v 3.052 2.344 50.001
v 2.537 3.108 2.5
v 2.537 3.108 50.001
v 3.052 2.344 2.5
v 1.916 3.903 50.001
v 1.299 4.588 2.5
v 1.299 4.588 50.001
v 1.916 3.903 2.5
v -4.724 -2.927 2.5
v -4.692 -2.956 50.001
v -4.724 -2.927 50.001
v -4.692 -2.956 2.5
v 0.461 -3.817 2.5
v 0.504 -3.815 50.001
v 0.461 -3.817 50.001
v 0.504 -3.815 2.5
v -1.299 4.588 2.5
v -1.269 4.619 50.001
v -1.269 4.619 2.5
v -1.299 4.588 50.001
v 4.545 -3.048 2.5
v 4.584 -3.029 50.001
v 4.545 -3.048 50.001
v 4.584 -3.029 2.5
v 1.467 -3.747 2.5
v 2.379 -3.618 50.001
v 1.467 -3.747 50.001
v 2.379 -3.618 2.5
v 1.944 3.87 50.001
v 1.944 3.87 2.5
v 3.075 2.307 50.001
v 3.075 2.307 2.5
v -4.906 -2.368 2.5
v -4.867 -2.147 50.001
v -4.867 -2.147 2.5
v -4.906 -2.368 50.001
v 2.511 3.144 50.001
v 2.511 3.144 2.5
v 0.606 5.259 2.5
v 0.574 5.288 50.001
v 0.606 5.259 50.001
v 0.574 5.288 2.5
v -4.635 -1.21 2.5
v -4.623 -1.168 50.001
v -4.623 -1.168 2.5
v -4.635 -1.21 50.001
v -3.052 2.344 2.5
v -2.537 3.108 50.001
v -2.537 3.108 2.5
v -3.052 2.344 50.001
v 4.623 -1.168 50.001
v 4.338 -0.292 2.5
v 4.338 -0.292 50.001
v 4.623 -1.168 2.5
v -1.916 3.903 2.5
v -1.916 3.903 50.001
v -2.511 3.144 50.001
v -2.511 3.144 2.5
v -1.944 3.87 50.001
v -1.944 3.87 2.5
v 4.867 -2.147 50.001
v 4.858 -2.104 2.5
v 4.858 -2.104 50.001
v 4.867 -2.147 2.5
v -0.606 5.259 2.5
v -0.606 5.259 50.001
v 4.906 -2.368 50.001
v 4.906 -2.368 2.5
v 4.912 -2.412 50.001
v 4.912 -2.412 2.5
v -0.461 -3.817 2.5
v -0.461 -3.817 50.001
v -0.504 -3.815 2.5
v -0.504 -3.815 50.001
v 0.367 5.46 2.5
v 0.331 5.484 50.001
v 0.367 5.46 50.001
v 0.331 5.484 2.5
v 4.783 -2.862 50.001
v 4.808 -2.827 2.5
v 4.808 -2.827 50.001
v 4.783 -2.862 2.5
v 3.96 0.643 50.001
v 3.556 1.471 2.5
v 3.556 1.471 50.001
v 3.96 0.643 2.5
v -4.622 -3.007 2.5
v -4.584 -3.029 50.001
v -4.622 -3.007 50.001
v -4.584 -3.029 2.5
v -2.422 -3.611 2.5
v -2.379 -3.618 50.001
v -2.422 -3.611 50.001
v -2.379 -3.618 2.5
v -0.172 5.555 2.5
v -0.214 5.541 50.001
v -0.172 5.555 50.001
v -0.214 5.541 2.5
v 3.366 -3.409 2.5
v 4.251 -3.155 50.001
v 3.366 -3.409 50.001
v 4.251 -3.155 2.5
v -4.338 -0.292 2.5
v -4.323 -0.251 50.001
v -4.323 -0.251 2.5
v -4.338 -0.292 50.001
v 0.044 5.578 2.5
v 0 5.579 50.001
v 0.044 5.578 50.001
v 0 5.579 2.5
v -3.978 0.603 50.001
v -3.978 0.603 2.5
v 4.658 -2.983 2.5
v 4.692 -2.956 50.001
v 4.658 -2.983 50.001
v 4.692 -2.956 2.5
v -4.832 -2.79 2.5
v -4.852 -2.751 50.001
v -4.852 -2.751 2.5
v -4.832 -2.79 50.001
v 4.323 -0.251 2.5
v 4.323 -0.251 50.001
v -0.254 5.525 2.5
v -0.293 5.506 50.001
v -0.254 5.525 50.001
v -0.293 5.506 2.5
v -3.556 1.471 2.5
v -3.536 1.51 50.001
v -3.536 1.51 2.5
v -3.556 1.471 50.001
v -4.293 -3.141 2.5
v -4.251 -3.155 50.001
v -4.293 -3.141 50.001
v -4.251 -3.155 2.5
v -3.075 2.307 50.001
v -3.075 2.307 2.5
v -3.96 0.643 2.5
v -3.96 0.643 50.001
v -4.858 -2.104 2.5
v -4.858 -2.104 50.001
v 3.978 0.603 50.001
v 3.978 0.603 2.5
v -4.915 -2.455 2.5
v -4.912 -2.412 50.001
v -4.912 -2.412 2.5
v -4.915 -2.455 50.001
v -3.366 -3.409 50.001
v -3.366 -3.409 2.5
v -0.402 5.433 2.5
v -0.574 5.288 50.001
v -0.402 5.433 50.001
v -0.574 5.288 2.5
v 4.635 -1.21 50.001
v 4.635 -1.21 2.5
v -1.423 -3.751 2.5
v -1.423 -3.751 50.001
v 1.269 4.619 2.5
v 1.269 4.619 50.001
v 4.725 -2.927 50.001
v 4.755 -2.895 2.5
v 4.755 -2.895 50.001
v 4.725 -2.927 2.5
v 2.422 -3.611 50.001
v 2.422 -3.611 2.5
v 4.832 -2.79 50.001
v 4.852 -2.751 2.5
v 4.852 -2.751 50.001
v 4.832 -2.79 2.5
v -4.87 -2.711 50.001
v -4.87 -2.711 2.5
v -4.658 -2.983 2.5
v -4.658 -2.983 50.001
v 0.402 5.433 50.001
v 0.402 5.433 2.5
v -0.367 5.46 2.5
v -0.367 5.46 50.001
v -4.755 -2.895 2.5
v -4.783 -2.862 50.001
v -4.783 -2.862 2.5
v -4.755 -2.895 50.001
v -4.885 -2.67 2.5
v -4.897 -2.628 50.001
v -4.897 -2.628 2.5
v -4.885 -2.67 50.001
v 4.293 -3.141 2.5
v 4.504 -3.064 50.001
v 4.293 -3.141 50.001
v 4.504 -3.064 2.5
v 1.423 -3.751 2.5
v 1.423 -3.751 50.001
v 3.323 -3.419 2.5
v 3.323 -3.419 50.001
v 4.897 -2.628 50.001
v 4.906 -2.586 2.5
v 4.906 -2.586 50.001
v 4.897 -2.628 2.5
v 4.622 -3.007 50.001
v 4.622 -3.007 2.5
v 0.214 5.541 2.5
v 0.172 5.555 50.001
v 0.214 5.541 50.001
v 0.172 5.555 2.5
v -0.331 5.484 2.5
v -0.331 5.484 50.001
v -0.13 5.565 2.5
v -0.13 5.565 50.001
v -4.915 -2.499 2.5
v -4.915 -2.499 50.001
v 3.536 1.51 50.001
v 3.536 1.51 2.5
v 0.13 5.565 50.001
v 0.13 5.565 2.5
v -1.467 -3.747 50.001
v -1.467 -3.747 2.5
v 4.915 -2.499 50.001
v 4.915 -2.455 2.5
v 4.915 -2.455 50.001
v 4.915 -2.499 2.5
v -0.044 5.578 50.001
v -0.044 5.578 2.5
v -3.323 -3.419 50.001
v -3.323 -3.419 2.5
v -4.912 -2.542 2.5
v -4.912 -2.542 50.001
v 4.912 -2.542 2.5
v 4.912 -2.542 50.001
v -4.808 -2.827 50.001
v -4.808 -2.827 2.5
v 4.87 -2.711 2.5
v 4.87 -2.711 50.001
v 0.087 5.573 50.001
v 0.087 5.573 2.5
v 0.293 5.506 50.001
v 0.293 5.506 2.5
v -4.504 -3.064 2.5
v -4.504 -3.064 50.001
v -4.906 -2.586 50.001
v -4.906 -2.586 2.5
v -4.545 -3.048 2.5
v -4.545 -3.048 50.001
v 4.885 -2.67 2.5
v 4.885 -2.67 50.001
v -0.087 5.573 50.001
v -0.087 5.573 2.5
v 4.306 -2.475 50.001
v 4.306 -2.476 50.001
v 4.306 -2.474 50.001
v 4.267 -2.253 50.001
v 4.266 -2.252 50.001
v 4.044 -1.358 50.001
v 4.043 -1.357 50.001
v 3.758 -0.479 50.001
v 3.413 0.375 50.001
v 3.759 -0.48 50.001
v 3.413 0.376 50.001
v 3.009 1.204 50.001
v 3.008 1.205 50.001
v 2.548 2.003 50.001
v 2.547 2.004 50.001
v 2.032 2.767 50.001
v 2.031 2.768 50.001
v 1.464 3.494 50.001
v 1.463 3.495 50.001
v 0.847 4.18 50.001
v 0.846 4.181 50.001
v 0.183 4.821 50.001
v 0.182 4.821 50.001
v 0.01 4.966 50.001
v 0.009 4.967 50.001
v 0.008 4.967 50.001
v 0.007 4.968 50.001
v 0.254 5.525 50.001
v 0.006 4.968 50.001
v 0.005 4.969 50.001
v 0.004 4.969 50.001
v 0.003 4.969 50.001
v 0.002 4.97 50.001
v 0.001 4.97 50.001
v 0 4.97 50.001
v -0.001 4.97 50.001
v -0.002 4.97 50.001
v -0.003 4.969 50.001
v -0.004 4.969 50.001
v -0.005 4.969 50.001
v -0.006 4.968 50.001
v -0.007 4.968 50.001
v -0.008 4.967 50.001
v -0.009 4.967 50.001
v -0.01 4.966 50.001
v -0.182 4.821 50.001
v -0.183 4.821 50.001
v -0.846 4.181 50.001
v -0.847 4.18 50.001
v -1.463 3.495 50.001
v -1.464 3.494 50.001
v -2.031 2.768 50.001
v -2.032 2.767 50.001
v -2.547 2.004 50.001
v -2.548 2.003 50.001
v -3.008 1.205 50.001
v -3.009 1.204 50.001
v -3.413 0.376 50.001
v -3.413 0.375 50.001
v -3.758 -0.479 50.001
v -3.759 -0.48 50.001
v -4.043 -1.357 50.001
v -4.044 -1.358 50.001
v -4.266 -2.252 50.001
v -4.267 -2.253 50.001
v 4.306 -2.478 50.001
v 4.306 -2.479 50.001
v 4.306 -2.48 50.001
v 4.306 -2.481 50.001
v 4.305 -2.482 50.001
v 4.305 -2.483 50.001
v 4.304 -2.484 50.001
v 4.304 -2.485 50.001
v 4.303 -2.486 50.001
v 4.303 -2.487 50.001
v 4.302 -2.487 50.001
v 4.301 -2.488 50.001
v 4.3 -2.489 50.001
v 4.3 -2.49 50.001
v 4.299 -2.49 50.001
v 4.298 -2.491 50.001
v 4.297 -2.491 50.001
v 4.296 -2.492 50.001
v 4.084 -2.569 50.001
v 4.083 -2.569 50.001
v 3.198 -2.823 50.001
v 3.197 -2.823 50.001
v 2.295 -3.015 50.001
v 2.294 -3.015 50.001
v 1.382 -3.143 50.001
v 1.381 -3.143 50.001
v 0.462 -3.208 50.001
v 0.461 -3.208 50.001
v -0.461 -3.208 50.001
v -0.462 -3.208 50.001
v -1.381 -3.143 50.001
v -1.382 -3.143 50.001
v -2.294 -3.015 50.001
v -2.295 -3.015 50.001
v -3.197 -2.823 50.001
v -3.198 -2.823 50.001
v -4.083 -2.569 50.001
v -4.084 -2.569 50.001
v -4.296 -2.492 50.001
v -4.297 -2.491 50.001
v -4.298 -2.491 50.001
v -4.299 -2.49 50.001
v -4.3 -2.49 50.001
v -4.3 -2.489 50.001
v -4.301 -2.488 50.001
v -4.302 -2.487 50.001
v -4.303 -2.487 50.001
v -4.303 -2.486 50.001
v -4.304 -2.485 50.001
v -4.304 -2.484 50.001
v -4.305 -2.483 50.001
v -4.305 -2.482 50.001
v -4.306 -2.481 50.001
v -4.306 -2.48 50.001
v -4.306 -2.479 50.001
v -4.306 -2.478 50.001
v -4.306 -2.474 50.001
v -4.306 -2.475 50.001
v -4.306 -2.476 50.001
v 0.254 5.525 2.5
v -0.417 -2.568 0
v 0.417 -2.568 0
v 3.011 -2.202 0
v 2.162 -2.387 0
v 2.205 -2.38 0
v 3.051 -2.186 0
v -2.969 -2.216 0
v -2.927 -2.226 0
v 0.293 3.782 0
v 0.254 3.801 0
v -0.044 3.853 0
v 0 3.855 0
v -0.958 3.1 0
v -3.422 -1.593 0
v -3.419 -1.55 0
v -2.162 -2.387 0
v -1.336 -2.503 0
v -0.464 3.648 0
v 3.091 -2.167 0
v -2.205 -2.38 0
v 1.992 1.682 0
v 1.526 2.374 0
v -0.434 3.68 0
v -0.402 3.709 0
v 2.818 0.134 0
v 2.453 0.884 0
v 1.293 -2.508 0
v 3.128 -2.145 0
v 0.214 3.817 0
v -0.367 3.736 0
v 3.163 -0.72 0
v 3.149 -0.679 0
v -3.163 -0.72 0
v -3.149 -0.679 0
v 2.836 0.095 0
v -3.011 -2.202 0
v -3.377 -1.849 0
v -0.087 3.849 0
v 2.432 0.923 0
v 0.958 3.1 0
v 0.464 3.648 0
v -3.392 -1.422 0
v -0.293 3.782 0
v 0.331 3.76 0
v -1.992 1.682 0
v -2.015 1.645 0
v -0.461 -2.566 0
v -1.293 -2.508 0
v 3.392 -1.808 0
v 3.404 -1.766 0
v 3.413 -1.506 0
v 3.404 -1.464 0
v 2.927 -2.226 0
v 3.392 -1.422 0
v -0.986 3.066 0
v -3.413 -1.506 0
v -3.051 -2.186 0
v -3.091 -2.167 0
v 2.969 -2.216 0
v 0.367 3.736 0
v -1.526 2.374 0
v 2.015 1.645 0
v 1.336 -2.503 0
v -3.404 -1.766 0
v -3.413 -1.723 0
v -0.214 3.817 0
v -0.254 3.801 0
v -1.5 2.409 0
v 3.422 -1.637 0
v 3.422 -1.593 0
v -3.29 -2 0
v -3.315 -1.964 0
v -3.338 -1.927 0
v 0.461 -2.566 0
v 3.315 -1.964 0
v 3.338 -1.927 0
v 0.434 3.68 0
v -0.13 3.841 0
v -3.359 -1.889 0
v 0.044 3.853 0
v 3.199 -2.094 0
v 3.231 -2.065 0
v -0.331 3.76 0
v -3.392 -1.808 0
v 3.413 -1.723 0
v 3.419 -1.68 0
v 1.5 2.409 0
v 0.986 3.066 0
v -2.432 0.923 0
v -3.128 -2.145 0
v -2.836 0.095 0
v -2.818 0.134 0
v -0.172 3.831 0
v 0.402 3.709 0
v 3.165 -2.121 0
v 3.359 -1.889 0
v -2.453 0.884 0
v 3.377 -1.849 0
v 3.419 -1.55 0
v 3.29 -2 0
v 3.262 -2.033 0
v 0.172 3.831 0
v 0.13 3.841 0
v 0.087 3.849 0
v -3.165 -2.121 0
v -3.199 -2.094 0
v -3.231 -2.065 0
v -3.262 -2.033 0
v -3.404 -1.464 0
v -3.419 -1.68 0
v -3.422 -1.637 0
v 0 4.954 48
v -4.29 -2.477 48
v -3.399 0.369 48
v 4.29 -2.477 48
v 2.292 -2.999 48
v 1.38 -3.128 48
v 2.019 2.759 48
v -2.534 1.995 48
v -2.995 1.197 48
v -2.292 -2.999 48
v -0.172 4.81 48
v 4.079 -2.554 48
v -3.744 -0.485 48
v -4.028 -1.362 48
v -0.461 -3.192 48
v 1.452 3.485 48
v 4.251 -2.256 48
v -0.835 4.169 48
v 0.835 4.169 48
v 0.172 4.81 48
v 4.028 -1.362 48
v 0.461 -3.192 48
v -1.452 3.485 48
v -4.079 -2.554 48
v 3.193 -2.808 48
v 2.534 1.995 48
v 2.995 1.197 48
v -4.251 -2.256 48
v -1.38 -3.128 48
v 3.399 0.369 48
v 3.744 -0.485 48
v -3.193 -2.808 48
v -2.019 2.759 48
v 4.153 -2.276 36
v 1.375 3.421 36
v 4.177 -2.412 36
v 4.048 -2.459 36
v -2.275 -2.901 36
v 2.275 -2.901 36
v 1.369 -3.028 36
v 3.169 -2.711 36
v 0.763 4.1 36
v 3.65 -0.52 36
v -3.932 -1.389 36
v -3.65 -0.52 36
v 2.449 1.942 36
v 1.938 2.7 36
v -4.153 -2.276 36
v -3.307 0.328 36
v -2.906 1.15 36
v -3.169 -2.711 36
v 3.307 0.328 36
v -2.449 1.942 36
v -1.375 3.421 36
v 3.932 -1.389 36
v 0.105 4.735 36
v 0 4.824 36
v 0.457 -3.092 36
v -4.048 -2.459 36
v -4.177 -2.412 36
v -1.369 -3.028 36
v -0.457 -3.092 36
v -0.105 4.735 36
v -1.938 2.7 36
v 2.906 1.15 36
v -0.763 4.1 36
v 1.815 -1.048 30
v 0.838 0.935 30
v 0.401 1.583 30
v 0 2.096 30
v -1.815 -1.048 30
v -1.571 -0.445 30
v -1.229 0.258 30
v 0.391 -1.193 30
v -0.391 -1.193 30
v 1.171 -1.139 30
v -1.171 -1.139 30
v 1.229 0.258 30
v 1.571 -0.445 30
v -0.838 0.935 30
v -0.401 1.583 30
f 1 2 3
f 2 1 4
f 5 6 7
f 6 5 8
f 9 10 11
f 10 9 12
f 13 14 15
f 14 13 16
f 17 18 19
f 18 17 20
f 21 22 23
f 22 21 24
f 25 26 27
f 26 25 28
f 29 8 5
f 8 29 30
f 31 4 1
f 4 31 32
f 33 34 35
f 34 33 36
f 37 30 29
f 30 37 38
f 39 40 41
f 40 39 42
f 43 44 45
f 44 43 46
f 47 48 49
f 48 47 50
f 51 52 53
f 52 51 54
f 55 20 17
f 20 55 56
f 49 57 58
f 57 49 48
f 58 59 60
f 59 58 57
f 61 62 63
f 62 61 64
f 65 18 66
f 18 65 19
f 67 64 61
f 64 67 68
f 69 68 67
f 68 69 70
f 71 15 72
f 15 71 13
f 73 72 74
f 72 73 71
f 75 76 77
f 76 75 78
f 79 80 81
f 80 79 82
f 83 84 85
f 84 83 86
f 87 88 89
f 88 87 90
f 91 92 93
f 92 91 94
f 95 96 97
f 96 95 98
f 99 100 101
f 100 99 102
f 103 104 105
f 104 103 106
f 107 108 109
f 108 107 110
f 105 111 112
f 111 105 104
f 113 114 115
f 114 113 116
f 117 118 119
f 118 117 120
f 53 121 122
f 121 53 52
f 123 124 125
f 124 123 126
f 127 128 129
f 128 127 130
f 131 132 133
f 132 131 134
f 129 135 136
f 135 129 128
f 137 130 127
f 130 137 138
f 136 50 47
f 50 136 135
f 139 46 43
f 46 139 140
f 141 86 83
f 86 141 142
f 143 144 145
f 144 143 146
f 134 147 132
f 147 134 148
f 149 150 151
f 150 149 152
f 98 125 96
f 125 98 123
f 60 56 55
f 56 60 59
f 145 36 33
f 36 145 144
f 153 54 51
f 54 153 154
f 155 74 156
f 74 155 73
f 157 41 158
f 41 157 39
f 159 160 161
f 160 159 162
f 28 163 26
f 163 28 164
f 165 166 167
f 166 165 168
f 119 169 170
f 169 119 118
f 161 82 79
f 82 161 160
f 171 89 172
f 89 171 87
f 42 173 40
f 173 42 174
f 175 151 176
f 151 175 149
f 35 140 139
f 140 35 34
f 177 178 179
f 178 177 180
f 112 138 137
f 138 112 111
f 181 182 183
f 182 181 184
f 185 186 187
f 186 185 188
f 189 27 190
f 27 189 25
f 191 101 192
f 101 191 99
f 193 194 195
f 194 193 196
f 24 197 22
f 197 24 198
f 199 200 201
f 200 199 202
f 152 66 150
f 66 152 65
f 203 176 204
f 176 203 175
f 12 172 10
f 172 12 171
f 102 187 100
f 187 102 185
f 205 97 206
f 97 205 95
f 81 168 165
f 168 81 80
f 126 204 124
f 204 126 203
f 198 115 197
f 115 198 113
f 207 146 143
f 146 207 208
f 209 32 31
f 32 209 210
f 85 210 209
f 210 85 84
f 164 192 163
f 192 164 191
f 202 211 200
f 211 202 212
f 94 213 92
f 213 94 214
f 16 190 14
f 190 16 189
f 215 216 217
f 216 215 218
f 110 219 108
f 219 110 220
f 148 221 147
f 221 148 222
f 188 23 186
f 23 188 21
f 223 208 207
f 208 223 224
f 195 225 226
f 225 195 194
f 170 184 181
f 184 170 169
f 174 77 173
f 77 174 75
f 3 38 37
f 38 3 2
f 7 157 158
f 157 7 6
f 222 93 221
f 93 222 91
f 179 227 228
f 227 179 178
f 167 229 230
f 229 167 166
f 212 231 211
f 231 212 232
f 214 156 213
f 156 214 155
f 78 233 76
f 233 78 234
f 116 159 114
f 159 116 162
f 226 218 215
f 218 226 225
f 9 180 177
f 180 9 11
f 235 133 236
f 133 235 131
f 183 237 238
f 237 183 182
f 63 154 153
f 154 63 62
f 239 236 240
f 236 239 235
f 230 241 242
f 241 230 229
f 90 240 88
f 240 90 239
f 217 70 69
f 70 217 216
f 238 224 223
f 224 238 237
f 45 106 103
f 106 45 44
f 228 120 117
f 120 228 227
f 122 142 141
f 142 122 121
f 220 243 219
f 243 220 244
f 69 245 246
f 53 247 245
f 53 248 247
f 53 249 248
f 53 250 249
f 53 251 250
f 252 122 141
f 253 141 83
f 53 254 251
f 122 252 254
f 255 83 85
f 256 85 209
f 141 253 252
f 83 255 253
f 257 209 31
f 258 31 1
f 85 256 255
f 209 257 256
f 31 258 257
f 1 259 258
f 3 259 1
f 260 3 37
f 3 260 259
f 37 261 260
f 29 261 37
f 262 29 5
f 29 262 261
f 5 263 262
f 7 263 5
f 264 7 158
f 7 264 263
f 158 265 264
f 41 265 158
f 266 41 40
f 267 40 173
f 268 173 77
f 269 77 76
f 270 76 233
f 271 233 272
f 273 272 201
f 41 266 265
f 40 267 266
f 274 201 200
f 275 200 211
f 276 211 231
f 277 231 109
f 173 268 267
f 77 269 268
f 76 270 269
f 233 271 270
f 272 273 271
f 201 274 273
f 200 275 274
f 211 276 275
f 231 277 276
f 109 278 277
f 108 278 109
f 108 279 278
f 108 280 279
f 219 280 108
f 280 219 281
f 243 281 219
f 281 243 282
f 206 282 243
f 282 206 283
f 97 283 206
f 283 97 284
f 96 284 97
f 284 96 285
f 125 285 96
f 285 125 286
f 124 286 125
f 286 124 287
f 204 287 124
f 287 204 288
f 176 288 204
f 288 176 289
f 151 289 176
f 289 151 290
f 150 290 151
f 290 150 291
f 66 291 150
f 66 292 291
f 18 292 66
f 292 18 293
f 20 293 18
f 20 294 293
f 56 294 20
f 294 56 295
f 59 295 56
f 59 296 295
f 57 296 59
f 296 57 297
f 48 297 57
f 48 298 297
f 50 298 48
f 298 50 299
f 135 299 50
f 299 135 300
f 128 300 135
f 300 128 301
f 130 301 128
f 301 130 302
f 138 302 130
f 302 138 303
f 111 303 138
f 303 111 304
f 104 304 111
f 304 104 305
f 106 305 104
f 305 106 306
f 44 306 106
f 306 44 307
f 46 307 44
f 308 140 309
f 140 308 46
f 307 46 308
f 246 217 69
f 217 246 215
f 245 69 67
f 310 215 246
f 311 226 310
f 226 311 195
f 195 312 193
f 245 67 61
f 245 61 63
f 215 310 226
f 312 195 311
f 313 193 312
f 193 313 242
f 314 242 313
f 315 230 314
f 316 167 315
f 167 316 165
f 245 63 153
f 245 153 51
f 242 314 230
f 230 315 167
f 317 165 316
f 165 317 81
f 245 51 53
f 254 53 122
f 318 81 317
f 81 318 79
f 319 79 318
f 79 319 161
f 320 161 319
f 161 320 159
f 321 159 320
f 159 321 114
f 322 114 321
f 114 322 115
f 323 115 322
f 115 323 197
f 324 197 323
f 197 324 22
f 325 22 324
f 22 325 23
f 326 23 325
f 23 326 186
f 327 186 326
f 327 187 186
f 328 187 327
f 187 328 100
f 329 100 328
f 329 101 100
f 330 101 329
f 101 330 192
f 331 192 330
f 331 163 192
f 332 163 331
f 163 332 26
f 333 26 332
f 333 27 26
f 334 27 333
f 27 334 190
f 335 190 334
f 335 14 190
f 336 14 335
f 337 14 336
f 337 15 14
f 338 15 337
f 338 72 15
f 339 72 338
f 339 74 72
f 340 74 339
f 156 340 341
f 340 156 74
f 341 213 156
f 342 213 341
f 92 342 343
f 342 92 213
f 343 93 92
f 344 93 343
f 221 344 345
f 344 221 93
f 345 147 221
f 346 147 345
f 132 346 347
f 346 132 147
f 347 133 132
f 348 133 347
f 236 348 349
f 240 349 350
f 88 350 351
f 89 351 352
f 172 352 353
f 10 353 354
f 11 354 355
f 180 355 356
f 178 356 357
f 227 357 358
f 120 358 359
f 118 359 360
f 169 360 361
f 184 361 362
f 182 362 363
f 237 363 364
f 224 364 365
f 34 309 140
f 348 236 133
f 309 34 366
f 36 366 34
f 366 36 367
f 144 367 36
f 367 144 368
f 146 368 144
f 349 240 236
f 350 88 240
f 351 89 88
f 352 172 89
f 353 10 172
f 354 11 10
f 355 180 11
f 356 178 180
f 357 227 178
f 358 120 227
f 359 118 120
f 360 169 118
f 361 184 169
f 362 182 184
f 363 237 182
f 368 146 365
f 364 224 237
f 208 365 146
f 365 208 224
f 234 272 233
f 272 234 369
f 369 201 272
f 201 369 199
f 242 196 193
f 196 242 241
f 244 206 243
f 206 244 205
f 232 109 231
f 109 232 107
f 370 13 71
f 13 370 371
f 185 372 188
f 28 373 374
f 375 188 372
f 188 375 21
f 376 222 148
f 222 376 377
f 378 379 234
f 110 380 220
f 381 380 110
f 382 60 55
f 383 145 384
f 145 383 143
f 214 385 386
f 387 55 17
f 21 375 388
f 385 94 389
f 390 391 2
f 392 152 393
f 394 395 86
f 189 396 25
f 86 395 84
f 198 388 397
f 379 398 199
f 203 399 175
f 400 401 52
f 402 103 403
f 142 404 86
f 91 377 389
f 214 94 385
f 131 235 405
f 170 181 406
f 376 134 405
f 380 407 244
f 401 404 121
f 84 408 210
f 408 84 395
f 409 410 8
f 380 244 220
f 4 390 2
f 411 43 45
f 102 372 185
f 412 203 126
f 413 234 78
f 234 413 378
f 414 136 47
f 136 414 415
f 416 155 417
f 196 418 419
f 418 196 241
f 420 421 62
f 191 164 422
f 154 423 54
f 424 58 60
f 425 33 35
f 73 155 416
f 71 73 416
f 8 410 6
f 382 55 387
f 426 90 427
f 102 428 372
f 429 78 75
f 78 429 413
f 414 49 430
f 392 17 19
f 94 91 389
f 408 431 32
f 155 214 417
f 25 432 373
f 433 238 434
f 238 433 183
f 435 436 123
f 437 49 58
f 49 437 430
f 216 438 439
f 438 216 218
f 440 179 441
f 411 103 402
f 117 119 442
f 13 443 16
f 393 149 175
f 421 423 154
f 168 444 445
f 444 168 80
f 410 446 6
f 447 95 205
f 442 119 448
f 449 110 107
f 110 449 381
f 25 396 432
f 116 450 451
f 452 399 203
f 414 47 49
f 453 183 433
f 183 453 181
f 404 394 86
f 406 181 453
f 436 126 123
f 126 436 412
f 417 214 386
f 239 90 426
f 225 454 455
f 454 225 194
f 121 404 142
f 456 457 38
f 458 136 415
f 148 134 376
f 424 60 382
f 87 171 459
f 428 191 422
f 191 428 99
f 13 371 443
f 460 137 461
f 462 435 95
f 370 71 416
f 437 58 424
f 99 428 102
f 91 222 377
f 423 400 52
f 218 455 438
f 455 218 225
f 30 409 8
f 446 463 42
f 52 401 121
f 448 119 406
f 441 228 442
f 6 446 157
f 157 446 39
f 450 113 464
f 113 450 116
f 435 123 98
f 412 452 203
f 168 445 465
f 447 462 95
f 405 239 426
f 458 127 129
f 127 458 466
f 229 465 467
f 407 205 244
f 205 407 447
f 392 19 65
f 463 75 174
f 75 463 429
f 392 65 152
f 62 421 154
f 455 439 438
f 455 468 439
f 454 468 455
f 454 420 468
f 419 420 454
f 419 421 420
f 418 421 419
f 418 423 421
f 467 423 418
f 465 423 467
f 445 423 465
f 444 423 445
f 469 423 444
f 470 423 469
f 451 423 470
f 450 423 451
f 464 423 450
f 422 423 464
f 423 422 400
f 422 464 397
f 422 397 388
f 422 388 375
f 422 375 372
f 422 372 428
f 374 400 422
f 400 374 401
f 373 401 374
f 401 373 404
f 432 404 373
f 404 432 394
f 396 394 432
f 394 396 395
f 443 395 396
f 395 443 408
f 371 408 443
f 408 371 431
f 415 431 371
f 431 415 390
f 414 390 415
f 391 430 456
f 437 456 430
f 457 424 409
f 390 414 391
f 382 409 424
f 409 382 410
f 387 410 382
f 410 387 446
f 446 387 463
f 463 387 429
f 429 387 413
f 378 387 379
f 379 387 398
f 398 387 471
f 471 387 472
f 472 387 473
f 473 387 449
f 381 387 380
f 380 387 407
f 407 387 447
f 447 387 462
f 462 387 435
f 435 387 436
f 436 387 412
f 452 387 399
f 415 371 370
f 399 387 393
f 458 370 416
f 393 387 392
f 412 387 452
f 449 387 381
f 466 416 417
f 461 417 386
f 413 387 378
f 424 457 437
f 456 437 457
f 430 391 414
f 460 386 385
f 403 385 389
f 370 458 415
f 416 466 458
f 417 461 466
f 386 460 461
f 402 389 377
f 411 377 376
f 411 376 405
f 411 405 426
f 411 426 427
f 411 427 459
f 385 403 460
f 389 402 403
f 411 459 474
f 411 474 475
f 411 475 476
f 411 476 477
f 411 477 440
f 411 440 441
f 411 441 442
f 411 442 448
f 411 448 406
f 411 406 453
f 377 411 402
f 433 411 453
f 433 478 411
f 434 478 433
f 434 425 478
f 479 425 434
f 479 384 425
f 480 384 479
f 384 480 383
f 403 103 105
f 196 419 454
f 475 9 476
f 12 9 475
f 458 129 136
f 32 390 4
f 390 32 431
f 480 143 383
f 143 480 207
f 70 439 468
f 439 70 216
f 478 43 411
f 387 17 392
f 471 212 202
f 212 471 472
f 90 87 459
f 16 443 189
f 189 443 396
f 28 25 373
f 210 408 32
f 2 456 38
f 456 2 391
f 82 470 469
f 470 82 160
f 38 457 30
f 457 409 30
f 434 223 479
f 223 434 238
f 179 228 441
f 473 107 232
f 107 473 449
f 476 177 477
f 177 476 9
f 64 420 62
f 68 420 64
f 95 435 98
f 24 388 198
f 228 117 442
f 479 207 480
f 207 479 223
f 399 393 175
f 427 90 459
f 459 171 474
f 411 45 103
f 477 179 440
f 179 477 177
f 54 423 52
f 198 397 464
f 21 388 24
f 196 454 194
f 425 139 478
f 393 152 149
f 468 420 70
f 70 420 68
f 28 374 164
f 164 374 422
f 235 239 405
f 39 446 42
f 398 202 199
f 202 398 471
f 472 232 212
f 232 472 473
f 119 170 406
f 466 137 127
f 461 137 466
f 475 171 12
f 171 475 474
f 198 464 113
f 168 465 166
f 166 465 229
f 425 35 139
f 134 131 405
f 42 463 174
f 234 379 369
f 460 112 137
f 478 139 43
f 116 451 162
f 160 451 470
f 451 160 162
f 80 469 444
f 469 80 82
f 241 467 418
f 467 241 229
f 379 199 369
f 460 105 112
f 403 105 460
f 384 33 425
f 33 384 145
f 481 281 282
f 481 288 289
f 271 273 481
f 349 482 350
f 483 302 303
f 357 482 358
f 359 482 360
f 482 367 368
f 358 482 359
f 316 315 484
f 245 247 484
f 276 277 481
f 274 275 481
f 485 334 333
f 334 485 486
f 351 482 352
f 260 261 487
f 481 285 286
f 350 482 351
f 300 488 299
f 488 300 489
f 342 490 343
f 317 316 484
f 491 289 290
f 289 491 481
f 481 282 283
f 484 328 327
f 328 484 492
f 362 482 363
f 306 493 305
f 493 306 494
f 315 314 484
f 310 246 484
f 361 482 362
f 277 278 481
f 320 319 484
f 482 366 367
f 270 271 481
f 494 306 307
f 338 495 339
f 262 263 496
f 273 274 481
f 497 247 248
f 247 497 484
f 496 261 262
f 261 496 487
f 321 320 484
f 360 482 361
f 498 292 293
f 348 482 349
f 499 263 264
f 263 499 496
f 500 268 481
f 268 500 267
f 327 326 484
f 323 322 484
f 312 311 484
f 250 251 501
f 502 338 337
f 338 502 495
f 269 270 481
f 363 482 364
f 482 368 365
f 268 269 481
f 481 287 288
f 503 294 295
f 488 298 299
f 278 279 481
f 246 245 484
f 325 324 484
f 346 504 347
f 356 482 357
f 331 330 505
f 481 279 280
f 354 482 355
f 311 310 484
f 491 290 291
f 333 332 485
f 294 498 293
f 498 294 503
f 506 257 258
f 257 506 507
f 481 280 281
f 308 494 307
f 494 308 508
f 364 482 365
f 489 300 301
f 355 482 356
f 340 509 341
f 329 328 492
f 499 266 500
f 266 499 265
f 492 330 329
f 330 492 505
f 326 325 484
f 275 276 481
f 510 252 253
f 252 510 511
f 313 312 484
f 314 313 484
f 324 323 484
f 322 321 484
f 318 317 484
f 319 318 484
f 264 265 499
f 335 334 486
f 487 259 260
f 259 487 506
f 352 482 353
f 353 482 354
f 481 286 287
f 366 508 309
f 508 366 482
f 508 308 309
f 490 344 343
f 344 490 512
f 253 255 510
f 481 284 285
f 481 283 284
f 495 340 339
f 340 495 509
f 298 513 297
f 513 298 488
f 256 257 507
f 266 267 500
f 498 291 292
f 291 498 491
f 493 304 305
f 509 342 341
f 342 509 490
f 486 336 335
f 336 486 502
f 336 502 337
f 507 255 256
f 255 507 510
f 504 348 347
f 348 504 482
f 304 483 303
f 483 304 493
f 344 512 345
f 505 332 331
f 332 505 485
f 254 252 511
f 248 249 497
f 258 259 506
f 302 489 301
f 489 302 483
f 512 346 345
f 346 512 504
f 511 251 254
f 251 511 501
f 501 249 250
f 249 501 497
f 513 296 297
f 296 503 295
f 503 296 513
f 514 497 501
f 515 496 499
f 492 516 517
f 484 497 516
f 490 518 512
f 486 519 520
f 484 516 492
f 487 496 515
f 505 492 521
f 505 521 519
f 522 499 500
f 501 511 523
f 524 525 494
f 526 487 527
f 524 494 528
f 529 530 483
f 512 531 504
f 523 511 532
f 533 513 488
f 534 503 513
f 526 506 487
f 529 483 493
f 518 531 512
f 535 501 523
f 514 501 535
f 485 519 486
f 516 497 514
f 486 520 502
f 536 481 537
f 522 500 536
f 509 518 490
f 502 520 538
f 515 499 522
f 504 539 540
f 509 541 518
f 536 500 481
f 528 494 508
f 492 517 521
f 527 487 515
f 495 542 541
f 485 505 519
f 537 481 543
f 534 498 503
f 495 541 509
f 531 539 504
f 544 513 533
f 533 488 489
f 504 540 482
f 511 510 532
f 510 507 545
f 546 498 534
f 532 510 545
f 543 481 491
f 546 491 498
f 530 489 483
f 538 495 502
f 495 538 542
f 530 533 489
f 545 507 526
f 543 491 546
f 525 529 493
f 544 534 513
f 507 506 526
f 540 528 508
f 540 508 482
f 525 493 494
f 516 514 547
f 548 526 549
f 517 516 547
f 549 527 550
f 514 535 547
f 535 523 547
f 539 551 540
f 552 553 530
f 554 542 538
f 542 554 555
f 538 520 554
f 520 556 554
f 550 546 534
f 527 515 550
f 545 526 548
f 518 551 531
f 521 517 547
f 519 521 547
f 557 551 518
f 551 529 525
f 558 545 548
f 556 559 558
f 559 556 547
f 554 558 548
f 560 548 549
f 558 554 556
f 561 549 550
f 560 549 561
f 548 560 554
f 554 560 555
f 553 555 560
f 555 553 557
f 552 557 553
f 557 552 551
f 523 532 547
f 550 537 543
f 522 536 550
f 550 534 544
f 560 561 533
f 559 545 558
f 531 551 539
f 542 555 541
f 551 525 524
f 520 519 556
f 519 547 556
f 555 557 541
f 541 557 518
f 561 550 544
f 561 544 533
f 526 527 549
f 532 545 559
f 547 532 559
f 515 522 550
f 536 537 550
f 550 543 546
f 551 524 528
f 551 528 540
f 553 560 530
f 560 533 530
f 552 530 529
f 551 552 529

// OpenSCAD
// file: hulls.scad
module hullPairs(pos,close=true){
    for(i=[0:len(pos)-2]){
        hull() {
            translate(pos[i+0]) children();
            translate(pos[i+1]) children();
        }
    }
    if(close)
    hull() {
        translate(pos[0]) children();
        translate(pos[len(pos)-1]) children();
    }
    
}

module hullLine() {
    for(o = [0:$children-2])  {
        hull() {
            children(o+0);
            children(o+1);
        }
    }
}
// main file
use <hulls.scad>

$W=1.2;


module shape(dia) {
    $fn=6;
    circle(d=dia);
}
module shapeE(dia,add=0) {
    linear_extrude(.001)
    offset($fn=90,add/4) {
        if($shape == 6) {
            circle($fn=6,d=dia);
        } else {
            D=2*dia;
            intersection() {
                    rotate(0)
                    translate([0,10,0])
                    circle(d=D);
                    rotate(120)
                    translate([0,10,0])
                    circle(d=D);
                    rotate(240)
                    translate([0,10,0])
                    circle(d=D);
            }
        }
    }
}

module shapeRealeaux(dia,add=0) {
    //https://en.wikipedia.org/wiki/Reuleaux_triangle
    fn=$fn;
    D=2*dia;
    linear_extrude(.001)
    offset($fn=90,add/4)
    intersection() {
            rotate(0)
            translate([0,10,0])
            circle(d=D);
            rotate(120)
            translate([0,10,0])
            circle(d=D);
            rotate(240)
            translate([0,10,0])
            circle(d=D);
    }
}


module  pencil_extender(L,D,close=false) {
    G=.1;
    ADD=2*$W+G;
    difference() {
        hullLine() {
            translate([0,0,L])
                shapeE(D,ADD);
            translate([0,0,ADD])
                shapeE(D,ADD);
            translate([0,0,0])
                shapeE(D-2*ADD/4,ADD);
        }
        hullLine() {
            translate([0,0,L+$W])
                shapeE(D,G);
            translate([0,0,L-2])
                shapeE(D);
            translate([0,0,L-14])
                shapeE(D-G);
            translate([0,0,L-20])
                shapeE(D-2);
        }
        if(close)
        for(a = [0:120:359]) 
            rotate(a)
        translate([0,-$W/2,L-7]) {
            cube([10,$W,10]);
        }
    }
}

module  pencil_extender0(L,D) {
    difference() {
        linear_extrude(L) {
            shape(D+2*$W);
        }
        translate([0,0,$W])
        linear_extrude(L) {
            shape(D);
        }
    }
}

mode="tri";
if(mode=="hex") {
    $shape=6;
    pencil_extender($fn=6,50,7.8);
}
if(mode=="tri") {
    $shape=3;
    pencil_extender($fn=3,50,13.2);
}

if(mode=="hexc") {
    pencil_extender($fn=6,50,7.5,true);
}
if(mode=="tric") {
    pencil_extender($fn=3,50,12.8,false);
}
